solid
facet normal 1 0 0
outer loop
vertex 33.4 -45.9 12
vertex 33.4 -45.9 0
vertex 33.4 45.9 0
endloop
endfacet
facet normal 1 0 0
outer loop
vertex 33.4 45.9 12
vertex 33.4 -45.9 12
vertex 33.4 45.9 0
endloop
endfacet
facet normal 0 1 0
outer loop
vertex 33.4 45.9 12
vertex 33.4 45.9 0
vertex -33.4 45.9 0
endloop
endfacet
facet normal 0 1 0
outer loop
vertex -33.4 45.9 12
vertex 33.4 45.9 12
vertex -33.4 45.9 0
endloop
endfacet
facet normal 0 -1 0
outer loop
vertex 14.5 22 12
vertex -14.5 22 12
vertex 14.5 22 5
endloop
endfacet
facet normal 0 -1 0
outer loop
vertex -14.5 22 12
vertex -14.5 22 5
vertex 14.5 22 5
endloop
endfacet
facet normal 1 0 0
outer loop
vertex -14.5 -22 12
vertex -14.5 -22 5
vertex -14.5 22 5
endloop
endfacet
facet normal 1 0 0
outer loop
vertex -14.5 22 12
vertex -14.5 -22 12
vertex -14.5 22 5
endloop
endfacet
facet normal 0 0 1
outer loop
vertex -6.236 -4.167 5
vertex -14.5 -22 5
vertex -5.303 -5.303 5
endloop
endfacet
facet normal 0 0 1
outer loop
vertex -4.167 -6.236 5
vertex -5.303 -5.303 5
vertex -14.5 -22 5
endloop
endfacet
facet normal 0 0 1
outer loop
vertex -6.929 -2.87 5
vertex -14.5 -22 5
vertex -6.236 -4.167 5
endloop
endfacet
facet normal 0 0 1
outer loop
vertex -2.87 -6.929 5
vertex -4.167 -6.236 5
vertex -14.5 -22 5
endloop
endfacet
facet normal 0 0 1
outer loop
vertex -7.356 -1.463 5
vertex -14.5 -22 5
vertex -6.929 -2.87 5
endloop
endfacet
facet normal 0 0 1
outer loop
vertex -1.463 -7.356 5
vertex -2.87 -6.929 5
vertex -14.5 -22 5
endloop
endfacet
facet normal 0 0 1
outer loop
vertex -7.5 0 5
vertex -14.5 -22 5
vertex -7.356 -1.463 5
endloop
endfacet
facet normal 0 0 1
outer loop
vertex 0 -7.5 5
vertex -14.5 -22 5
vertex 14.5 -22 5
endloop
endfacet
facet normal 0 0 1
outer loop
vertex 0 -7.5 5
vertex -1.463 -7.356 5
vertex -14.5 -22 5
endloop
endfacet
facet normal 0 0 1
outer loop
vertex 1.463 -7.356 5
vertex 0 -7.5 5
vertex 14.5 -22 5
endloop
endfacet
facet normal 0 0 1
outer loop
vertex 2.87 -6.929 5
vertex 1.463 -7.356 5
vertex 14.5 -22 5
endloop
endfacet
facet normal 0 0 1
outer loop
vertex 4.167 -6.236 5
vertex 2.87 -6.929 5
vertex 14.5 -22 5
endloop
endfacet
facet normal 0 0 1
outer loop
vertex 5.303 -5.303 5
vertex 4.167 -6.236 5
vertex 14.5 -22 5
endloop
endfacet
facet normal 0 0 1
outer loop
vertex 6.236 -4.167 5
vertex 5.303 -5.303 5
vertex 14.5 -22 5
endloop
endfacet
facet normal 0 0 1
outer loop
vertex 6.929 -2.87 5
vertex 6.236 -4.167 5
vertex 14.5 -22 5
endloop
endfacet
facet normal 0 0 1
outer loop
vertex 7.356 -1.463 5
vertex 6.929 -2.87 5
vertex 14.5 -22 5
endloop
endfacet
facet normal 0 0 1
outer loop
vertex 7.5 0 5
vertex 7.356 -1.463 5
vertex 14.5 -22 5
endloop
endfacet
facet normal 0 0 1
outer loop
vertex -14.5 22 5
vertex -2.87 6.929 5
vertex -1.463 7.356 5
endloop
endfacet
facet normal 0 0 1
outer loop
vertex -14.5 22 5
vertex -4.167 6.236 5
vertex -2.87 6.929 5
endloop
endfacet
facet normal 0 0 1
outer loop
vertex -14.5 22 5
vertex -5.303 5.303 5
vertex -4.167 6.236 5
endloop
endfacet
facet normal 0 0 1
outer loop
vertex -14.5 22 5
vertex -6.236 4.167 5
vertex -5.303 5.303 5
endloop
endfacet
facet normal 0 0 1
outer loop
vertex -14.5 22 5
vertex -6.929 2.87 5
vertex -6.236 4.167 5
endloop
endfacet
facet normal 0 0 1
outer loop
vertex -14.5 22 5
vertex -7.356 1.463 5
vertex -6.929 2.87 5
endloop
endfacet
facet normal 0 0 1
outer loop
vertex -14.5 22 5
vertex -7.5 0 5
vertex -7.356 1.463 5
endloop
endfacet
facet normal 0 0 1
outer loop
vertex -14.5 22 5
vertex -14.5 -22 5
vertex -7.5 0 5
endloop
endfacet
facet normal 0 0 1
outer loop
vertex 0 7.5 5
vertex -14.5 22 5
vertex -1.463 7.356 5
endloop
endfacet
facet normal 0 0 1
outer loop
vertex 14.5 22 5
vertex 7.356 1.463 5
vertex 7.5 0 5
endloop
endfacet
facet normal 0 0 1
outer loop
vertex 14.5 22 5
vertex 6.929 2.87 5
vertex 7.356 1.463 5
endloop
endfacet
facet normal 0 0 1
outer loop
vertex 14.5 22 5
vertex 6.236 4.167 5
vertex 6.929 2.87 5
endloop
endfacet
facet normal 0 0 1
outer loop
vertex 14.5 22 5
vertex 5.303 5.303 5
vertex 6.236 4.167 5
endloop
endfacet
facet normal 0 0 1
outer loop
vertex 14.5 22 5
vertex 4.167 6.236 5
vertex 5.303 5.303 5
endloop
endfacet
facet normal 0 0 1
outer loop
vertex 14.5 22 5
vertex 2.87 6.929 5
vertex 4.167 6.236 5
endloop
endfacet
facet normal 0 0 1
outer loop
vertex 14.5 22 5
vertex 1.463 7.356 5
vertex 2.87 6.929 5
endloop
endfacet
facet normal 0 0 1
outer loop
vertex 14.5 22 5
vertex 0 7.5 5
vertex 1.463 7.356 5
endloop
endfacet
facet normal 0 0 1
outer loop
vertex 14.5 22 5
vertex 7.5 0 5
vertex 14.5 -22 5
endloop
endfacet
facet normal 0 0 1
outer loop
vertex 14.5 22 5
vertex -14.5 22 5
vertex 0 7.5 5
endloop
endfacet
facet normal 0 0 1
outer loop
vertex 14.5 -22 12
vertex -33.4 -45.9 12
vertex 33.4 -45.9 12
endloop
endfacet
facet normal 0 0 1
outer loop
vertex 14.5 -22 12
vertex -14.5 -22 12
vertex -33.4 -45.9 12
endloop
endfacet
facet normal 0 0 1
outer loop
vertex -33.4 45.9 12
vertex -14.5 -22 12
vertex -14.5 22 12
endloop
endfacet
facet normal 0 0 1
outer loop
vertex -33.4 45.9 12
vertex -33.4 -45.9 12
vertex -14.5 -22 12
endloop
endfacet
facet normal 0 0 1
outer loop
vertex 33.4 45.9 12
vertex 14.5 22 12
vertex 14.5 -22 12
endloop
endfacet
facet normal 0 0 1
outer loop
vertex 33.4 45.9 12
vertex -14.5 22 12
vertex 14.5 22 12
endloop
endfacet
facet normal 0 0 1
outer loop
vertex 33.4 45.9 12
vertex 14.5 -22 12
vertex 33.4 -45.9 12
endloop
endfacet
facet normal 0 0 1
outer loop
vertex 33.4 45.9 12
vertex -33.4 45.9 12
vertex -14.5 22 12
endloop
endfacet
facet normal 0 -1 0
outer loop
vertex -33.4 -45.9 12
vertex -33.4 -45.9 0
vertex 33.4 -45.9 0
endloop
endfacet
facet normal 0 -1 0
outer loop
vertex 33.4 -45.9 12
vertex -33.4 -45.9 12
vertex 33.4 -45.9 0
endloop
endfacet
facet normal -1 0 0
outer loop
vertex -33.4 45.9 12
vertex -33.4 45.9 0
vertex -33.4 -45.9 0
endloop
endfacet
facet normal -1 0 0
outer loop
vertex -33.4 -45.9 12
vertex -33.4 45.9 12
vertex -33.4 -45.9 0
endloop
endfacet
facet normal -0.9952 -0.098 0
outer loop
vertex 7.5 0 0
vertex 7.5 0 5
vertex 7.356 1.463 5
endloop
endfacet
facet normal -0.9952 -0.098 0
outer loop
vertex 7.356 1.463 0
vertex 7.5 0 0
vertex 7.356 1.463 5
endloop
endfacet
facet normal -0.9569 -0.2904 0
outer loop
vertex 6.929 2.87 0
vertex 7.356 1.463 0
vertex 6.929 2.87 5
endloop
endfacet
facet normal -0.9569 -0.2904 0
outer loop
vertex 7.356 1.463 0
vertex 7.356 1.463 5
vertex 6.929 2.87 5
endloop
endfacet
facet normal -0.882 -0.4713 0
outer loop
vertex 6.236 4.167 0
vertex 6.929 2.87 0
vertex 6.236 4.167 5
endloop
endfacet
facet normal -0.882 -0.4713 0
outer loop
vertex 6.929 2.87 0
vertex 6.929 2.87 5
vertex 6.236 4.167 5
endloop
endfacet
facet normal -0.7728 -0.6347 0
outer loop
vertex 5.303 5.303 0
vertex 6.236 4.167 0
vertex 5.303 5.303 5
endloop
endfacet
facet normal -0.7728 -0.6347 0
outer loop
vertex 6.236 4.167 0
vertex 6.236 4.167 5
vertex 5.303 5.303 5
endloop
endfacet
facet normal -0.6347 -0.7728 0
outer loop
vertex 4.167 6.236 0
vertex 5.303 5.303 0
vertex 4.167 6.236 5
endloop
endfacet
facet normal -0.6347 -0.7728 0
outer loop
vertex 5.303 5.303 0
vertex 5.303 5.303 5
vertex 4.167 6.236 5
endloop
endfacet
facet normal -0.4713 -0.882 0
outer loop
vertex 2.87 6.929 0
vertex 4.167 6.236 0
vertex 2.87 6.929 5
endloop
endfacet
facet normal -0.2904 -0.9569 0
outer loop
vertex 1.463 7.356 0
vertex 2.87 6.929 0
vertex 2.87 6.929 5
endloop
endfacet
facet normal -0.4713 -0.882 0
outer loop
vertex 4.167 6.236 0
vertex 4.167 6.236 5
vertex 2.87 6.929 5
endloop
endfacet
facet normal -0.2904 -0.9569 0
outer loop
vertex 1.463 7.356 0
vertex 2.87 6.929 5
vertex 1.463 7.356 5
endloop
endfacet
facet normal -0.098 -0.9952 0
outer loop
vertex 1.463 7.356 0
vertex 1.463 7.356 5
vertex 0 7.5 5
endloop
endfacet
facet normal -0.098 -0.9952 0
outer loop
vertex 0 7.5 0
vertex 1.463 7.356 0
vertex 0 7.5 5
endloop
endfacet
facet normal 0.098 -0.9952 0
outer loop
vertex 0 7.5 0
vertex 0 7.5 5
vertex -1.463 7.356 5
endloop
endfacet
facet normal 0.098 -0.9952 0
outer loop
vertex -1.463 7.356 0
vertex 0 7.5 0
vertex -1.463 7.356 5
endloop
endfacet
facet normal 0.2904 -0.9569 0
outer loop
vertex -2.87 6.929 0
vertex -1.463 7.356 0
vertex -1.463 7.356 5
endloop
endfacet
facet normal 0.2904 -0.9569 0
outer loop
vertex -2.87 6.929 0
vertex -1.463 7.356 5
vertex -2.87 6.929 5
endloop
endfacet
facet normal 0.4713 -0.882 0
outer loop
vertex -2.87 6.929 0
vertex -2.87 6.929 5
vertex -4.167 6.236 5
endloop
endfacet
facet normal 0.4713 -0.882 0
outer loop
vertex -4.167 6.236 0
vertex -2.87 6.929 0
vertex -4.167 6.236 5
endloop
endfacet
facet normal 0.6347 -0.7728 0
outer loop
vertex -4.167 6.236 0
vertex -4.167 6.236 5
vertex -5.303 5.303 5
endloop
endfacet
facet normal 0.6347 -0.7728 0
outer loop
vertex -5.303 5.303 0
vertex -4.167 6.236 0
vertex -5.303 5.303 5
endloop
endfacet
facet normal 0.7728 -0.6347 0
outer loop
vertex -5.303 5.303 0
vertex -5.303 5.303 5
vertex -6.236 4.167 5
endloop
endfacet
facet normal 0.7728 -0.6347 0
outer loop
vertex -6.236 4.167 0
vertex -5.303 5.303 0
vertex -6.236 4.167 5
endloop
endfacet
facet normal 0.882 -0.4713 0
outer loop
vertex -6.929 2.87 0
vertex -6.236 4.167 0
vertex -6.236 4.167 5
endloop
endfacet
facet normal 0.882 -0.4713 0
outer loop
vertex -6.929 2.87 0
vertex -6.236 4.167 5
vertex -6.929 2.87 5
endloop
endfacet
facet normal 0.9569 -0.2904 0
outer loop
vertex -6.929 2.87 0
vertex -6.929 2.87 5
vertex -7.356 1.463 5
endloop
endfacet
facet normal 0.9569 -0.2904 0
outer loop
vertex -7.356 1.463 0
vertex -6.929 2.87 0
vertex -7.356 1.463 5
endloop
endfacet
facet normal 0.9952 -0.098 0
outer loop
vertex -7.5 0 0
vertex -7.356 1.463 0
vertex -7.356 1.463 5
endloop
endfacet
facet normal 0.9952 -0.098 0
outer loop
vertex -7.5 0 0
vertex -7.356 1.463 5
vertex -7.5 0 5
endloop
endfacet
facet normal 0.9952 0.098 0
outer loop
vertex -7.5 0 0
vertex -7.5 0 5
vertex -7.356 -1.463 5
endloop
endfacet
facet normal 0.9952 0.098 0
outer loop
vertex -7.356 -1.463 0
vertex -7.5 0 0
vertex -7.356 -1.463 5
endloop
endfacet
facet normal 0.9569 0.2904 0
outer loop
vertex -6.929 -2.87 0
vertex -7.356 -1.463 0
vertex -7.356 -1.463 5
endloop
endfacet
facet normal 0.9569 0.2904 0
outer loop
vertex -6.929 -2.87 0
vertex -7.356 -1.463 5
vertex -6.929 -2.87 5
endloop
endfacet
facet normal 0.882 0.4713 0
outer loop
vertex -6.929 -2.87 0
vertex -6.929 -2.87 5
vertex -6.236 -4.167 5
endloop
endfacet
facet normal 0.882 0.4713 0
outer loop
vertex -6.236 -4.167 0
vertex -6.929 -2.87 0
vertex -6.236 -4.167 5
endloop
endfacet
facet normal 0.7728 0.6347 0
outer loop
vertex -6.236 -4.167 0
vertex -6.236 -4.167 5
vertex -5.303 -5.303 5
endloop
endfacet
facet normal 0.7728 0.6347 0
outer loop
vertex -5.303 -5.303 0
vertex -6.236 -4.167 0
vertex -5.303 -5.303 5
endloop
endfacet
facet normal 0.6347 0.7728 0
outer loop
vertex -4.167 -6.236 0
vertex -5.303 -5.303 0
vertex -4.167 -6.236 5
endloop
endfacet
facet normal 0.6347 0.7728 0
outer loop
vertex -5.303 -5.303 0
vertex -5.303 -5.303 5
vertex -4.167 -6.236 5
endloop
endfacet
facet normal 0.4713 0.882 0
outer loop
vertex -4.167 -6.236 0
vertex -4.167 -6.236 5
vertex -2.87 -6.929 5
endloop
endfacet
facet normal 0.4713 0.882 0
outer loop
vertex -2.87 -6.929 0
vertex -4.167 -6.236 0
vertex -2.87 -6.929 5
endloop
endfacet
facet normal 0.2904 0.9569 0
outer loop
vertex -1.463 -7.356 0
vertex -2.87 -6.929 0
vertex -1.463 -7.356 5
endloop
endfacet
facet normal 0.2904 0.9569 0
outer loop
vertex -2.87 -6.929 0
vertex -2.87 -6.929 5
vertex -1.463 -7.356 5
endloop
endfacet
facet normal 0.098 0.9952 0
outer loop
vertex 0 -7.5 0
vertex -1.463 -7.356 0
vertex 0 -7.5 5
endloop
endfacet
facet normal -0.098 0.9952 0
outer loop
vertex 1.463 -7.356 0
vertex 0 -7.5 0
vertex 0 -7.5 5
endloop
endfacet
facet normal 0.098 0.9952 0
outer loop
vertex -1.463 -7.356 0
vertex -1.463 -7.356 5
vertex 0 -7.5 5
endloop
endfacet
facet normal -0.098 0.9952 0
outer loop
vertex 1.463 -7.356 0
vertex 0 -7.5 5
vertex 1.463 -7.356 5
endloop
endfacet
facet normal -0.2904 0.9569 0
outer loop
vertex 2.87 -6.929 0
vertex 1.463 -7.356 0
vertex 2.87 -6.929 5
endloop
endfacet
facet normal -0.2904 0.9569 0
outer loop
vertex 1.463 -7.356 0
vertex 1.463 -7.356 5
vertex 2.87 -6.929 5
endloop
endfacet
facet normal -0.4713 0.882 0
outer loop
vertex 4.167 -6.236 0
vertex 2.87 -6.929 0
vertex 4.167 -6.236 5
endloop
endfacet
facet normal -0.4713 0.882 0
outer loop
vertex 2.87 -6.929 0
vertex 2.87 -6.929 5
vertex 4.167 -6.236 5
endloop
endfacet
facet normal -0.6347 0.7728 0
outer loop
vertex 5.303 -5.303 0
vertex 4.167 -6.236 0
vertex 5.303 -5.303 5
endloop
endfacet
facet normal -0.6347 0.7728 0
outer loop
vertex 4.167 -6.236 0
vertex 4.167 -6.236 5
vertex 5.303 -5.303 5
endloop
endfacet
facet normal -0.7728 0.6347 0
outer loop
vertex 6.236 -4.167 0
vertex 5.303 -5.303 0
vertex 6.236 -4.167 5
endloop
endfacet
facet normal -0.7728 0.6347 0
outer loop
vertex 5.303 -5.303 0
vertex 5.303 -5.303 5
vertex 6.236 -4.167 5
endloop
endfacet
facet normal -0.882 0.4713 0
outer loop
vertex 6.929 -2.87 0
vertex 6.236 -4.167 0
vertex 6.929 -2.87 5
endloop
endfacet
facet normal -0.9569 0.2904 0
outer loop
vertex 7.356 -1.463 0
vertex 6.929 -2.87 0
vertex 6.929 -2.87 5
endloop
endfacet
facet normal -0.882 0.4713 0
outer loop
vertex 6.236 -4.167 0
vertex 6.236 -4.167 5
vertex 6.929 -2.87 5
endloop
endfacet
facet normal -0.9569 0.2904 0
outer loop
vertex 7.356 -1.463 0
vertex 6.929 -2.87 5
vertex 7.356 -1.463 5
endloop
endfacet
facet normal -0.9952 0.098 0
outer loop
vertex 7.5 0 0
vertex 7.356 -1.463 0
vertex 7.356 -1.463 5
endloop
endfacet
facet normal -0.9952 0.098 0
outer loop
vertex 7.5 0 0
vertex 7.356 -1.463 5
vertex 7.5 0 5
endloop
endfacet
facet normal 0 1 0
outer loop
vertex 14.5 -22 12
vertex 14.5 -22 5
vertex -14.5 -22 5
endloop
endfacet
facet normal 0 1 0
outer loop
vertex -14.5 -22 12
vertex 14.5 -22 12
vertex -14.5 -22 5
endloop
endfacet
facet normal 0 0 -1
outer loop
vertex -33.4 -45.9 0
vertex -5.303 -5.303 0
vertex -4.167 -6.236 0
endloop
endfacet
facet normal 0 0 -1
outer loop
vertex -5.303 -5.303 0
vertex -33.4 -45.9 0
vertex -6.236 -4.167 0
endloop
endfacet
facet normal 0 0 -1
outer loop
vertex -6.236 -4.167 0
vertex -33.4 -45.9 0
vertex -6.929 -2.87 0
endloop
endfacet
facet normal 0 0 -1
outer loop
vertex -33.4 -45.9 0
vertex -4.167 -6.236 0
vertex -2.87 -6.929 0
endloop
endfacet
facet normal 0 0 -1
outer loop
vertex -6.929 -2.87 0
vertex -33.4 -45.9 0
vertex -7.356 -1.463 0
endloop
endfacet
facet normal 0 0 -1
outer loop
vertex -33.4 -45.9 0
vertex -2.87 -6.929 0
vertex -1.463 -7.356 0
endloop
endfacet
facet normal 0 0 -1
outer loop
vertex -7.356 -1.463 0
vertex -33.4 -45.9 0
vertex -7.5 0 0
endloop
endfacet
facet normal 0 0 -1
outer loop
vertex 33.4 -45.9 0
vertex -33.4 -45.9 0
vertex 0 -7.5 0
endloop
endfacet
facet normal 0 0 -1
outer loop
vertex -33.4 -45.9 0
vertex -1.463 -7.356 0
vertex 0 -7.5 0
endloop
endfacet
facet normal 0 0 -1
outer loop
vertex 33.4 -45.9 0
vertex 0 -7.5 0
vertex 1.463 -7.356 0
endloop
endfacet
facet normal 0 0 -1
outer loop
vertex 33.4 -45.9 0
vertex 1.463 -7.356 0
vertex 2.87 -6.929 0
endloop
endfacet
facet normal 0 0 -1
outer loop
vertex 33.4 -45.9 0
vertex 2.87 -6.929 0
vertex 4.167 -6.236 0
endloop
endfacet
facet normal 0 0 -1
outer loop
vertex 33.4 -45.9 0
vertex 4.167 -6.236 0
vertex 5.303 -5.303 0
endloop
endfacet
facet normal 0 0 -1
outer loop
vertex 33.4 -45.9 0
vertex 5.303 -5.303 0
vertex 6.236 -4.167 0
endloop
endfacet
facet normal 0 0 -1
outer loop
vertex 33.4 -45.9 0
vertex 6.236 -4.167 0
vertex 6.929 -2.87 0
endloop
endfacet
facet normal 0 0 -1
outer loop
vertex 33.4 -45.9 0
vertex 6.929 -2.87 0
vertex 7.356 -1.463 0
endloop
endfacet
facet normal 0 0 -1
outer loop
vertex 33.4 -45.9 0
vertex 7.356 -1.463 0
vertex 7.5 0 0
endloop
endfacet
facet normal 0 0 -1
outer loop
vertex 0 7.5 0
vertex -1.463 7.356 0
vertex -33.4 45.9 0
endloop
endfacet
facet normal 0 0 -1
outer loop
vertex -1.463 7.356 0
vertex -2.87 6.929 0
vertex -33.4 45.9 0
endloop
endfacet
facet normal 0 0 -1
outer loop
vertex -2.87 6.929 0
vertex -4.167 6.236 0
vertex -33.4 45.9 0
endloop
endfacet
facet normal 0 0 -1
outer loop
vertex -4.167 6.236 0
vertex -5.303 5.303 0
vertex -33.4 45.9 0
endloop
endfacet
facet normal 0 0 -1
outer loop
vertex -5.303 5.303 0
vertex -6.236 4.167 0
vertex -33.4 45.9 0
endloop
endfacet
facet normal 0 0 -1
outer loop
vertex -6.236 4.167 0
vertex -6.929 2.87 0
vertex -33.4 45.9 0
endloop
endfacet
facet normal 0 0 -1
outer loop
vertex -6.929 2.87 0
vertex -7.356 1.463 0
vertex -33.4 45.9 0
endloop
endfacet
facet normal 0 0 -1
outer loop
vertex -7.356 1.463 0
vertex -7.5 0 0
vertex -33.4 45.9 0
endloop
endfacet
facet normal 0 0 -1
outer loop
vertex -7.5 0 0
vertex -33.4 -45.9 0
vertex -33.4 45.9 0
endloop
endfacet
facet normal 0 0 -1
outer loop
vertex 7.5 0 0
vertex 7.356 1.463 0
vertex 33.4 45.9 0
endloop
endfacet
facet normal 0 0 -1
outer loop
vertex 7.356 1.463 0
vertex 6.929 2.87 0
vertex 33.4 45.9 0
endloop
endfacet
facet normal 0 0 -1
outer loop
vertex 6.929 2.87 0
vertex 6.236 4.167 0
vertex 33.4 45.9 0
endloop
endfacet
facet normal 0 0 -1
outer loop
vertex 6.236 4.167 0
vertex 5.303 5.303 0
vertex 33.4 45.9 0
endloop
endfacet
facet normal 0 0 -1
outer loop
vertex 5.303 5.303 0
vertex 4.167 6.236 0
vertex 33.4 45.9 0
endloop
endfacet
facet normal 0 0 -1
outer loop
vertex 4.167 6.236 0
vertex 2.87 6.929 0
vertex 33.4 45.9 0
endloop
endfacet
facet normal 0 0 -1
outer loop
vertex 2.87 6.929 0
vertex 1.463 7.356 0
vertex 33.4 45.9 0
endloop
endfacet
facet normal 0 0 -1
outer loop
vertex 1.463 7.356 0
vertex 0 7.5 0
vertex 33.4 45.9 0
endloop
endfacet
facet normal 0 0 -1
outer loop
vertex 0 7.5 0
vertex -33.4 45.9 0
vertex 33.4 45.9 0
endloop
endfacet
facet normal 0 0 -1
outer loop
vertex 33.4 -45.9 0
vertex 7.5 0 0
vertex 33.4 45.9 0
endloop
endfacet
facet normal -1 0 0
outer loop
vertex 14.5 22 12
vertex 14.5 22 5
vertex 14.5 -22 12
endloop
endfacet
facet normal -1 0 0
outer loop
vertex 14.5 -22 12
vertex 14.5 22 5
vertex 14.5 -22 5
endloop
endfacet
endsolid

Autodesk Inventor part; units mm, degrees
ref_plane "YZ Plane" through (0, 0, 0) normal (1, 0, 0) x (0, 1, 0)
ref_plane "XZ Plane" through (0, 0, 0) normal (0, 1, 0) x (-1, 0, 0)
ref_plane "XY Plane" through (0, 0, 0) normal (0, 0, 1) x (1, 0, 0)
ref_plane "Arbeitsebene1" through (0, 0, 0) normal (0, 0, 1) x (1, 0, 0)
sketch "Skizze1" plane through (0, 0, 0) normal (0, 0, 1) x (1, 0, 0)
  line L0 (-28.4, 40.9) -> (28.4, 40.9) projected
  line L1 (28.4, 40.9) -> (28.4, -40.9) projected
  line L2 (28.4, -40.9) -> (-28.4, -40.9) projected
  line L3 (-28.4, -40.9) -> (-28.4, 40.9) projected
  line L4 (-33.4, 45.9) -> (-33.4, -45.9) projected
  line L5 (-33.4, -45.9) -> (33.4, -45.9) projected
  line L6 (33.4, -45.9) -> (33.4, 45.9) projected
  line L7 (33.4, 45.9) -> (-33.4, 45.9) projected
  line L8 (-28.4, 40.9) -> (28.4, 40.9) projected
  line L9 (28.4, 40.9) -> (28.4, -40.9) projected
  line L10 (28.4, -40.9) -> (-28.4, -40.9) projected
  line L11 (-28.4, -40.9) -> (-28.4, 40.9) projected
  line L12 (-33.4, 45.9) -> (-33.4, -45.9) projected
  line L13 (-33.4, -45.9) -> (33.4, -45.9) projected
  line L14 (33.4, -45.9) -> (33.4, 45.9) projected
  line L15 (33.4, 45.9) -> (-33.4, 45.9) projected
  point P0 (0, 0)
extrude "Extrusion1" add sketch "Skizze1" along normal blind 5 contours L0 L1 L2 L3 | L7 L6 L5 L4
sketch "Skizze2" plane through (0, 0, 5) normal (0, 0, 1) x (1, 0, 0)
  circle A0 centre (0, 0) radius 7.5
  dimension "d2" = 15
extrude "Extrusion2" cut sketch "Skizze2" against normal up to next
sketch "Skizze3" plane through (0, 0, 5) normal (0, 0, 1) x (1, 0, 0)
  line L0 (-33.4, 45.9) -> (-33.4, -45.9) projected
  line L1 (-33.4, -45.9) -> (33.4, -45.9) projected
  line L2 (33.4, -45.9) -> (33.4, 45.9) projected
  line L3 (33.4, 45.9) -> (-33.4, 45.9) projected
  line L4 (-14.5, 22) -> (14.5, 22)
  line L5 (14.5, 22) -> (14.5, -22)
  line L6 (14.5, -22) -> (-14.5, -22)
  line L7 (-14.5, -22) -> (-14.5, 22)
  line L8 (0, -64.26) -> (0, 64.26) projected
  line L9 (-46.76, 0) -> (46.76, 0) projected
  dimension "d9" = 29
  dimension "d10" = 44
extrude "Extrusion4" add sketch "Skizze3" along normal blind 7 contours L3 L8 L4 L7 L9 L0 | L9 L7 L6 L8 L1 L0 | L3 L2 L9 L5 L4 L8 | L8 L6 L5 L9 L2 L1
properties part number "InlayOben" material "Gummi, Silikon"
